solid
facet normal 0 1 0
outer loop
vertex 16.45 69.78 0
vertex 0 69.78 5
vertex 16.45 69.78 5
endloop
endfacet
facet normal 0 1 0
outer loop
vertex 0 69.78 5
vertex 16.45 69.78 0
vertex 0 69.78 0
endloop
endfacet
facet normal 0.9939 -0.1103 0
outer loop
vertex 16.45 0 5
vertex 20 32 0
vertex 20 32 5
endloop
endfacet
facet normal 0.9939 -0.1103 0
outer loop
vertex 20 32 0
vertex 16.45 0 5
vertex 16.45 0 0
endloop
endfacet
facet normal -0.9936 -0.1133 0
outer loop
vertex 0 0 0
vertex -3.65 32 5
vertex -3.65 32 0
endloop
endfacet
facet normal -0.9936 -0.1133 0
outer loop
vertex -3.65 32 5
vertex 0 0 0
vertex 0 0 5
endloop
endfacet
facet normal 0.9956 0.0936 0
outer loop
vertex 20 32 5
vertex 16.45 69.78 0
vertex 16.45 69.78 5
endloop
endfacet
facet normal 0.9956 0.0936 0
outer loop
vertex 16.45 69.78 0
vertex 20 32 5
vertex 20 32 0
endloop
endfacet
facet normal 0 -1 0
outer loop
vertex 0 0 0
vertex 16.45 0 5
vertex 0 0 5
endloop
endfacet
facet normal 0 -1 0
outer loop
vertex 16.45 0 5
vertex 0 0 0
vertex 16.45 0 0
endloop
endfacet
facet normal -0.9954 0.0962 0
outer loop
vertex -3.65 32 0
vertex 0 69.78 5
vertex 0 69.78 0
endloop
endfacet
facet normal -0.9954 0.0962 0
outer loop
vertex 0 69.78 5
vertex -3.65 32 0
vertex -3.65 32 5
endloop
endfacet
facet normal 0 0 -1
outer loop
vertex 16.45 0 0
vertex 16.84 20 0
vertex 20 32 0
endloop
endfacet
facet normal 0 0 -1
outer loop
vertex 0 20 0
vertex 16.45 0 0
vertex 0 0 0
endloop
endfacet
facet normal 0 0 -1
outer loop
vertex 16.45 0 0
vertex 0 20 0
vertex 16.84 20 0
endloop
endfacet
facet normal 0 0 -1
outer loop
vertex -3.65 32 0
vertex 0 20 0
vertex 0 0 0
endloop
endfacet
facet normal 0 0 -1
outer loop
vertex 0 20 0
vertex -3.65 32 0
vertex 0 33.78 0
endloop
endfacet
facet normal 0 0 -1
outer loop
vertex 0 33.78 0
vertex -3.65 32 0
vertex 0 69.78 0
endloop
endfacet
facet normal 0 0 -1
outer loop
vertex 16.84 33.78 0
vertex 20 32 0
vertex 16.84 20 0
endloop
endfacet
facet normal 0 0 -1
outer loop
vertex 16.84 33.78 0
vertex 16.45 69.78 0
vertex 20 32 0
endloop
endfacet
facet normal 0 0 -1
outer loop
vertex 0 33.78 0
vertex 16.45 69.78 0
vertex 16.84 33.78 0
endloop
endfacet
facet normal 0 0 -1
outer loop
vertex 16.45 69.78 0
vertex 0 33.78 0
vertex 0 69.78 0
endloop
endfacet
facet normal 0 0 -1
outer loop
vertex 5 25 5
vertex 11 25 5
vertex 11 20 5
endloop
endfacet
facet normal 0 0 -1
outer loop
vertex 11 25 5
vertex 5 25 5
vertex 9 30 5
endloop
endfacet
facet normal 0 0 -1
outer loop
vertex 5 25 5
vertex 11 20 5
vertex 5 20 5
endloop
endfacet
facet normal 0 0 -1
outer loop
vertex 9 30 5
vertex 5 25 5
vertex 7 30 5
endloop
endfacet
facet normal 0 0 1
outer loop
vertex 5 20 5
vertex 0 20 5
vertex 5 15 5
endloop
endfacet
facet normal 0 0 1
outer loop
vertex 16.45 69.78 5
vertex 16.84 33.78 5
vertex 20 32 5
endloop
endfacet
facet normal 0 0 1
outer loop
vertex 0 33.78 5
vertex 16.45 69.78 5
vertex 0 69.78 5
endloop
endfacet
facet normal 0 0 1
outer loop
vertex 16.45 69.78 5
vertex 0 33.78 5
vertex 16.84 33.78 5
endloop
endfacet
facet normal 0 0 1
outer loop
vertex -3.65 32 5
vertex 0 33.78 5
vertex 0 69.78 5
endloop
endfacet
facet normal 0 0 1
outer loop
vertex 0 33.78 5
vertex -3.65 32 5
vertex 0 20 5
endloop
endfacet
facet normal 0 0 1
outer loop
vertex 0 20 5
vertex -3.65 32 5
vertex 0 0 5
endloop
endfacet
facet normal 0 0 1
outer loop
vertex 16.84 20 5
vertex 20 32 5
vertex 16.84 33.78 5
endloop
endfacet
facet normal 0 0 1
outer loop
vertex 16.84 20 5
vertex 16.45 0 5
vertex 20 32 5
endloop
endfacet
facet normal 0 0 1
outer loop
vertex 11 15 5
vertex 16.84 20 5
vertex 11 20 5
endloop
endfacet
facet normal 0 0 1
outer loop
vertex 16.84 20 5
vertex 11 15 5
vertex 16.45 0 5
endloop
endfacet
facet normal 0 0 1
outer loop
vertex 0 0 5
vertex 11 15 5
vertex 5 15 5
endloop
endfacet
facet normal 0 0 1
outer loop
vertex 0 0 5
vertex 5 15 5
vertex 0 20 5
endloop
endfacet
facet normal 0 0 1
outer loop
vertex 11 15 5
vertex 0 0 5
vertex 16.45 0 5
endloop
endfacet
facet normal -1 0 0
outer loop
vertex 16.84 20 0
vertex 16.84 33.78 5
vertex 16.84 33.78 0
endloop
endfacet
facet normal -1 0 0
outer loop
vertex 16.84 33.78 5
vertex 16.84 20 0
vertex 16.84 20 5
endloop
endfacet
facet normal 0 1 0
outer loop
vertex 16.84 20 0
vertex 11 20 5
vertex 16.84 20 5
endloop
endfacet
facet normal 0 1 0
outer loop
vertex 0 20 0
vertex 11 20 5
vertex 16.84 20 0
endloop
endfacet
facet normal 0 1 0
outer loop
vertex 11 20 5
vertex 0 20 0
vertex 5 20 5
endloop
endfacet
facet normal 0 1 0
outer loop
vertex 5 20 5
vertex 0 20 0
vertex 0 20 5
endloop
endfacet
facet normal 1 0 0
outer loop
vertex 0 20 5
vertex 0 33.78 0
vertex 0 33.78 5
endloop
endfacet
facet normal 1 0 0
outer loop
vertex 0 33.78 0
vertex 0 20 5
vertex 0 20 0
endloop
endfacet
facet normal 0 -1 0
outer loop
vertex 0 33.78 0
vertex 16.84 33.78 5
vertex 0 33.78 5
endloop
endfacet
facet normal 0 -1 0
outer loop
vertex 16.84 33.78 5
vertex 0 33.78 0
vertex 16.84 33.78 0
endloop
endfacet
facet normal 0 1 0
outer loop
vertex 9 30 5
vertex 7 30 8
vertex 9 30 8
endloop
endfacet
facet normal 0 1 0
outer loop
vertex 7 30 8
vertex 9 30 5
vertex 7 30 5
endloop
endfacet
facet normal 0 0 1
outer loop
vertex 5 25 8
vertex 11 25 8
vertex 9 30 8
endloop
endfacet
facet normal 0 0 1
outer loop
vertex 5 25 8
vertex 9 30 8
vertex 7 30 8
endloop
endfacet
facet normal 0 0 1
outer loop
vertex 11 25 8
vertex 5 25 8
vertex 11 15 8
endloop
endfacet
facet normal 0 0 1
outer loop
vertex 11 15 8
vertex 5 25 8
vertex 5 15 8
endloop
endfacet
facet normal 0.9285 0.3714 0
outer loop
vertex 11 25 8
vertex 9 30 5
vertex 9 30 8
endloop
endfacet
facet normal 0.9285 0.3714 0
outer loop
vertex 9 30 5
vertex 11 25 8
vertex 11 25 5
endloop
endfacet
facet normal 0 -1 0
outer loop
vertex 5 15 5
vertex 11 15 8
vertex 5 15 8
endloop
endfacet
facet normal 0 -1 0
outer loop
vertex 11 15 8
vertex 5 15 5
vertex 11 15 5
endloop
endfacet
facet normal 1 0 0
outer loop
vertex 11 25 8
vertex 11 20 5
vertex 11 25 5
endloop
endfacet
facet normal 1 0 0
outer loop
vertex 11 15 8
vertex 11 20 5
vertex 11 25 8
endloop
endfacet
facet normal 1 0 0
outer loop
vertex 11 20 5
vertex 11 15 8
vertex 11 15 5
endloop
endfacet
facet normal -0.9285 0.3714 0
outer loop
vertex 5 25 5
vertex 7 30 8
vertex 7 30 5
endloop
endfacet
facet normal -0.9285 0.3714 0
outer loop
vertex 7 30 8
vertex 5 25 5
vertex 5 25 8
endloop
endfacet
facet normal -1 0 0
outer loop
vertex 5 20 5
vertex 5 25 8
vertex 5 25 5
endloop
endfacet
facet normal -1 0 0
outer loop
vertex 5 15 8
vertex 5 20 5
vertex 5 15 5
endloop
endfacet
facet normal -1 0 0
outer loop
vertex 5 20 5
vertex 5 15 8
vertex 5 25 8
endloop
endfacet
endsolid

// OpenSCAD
// Hang your coat for Bill 
// hanging_hook part
// by ftoad, 08/24/2011
// 

//************Variables**********************************************************

padding = 0.1;
rect_points = [[0,0], [16.45,0],[20,32],[16.45,69.78],[0,69.78],[-3.65,32]];  // turn this into the appropriate variable type
rect_path =[[0,1,2,3,4,5]] ;

square_points = [[0,0], [0,13.78],[16.84,13.78],[16.84,0]];
square_path = [[0,1,2,3]];
profile= 5;
fn_rule = 100;

hook_points = [[0,0],[6,0],[6,10],[4,15],[2,15],[0,10]];
hook_path = [[0,1,2,3,4,5]];

//************Modules **************************************************************



module base(){
   polygon(points= rect_points,paths=rect_path );
 } 

module inner_square(){
   polygon(points=square_points,paths=square_path);
}


module hook(){
   polygon(points = hook_points, paths=hook_path);
}


//************Build**************************************************************


difference(){
  linear_extrude(height=profile, $fn=fn_rule){
  base();
  }
  translate([0,20,-padding]) {
     linear_extrude(height=2*profile,$fn=fn_rule){
     inner_square();
     }
  }
}


    translate([5,15,profile]){
          linear_extrude(height=3,twist=0){
             hook();
          }
    }
